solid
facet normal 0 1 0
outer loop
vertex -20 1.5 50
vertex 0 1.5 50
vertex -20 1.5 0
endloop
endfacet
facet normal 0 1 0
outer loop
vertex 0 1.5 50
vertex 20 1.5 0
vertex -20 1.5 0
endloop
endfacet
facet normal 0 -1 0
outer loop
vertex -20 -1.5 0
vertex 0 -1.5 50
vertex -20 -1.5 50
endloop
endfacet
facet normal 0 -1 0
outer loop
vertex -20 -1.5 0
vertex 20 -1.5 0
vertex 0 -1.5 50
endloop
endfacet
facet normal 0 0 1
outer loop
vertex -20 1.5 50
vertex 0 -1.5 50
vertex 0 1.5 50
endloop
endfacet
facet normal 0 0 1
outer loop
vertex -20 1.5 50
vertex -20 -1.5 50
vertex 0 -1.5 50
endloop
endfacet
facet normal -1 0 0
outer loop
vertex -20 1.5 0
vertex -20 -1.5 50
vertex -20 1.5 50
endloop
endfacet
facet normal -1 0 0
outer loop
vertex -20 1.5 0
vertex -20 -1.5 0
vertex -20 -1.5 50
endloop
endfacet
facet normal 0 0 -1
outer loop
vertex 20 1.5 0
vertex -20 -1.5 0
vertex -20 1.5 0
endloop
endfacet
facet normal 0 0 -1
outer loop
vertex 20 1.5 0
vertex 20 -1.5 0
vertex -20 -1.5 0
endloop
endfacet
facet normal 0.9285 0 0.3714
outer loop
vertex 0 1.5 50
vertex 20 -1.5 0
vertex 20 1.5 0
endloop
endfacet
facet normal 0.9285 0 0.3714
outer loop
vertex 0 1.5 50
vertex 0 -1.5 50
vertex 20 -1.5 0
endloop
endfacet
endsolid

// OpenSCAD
///////////////////////////////////////////////////////////////////////////////
// Filename 		: SimpleTail.scad
// Main Module   	: Plane
// Sub-module	: tail
// Version  		: v1.0
// Category 		: Transportation
// Modified 		: 18 Sept 2016
// Author   		: Jason Yeo
///////////////////////////////////////////////////////////////////////////////
// Refer to drawing for Plane.pptx.
//
// A SIMPLE PLANE
// 
///////////////////////////////////////////////////////////////////////////////

Tail();

module Tail(t1=20, t2=40, h1=50, thick=3)
{	
	data=[[0,0],[0, h1], [t1,h1], [t2,0]];	
	translate([-t2/2,thick/2,0]) color("LightGreen") rotate([90,0,0])linear_extrude(thick) polygon(data);
}
